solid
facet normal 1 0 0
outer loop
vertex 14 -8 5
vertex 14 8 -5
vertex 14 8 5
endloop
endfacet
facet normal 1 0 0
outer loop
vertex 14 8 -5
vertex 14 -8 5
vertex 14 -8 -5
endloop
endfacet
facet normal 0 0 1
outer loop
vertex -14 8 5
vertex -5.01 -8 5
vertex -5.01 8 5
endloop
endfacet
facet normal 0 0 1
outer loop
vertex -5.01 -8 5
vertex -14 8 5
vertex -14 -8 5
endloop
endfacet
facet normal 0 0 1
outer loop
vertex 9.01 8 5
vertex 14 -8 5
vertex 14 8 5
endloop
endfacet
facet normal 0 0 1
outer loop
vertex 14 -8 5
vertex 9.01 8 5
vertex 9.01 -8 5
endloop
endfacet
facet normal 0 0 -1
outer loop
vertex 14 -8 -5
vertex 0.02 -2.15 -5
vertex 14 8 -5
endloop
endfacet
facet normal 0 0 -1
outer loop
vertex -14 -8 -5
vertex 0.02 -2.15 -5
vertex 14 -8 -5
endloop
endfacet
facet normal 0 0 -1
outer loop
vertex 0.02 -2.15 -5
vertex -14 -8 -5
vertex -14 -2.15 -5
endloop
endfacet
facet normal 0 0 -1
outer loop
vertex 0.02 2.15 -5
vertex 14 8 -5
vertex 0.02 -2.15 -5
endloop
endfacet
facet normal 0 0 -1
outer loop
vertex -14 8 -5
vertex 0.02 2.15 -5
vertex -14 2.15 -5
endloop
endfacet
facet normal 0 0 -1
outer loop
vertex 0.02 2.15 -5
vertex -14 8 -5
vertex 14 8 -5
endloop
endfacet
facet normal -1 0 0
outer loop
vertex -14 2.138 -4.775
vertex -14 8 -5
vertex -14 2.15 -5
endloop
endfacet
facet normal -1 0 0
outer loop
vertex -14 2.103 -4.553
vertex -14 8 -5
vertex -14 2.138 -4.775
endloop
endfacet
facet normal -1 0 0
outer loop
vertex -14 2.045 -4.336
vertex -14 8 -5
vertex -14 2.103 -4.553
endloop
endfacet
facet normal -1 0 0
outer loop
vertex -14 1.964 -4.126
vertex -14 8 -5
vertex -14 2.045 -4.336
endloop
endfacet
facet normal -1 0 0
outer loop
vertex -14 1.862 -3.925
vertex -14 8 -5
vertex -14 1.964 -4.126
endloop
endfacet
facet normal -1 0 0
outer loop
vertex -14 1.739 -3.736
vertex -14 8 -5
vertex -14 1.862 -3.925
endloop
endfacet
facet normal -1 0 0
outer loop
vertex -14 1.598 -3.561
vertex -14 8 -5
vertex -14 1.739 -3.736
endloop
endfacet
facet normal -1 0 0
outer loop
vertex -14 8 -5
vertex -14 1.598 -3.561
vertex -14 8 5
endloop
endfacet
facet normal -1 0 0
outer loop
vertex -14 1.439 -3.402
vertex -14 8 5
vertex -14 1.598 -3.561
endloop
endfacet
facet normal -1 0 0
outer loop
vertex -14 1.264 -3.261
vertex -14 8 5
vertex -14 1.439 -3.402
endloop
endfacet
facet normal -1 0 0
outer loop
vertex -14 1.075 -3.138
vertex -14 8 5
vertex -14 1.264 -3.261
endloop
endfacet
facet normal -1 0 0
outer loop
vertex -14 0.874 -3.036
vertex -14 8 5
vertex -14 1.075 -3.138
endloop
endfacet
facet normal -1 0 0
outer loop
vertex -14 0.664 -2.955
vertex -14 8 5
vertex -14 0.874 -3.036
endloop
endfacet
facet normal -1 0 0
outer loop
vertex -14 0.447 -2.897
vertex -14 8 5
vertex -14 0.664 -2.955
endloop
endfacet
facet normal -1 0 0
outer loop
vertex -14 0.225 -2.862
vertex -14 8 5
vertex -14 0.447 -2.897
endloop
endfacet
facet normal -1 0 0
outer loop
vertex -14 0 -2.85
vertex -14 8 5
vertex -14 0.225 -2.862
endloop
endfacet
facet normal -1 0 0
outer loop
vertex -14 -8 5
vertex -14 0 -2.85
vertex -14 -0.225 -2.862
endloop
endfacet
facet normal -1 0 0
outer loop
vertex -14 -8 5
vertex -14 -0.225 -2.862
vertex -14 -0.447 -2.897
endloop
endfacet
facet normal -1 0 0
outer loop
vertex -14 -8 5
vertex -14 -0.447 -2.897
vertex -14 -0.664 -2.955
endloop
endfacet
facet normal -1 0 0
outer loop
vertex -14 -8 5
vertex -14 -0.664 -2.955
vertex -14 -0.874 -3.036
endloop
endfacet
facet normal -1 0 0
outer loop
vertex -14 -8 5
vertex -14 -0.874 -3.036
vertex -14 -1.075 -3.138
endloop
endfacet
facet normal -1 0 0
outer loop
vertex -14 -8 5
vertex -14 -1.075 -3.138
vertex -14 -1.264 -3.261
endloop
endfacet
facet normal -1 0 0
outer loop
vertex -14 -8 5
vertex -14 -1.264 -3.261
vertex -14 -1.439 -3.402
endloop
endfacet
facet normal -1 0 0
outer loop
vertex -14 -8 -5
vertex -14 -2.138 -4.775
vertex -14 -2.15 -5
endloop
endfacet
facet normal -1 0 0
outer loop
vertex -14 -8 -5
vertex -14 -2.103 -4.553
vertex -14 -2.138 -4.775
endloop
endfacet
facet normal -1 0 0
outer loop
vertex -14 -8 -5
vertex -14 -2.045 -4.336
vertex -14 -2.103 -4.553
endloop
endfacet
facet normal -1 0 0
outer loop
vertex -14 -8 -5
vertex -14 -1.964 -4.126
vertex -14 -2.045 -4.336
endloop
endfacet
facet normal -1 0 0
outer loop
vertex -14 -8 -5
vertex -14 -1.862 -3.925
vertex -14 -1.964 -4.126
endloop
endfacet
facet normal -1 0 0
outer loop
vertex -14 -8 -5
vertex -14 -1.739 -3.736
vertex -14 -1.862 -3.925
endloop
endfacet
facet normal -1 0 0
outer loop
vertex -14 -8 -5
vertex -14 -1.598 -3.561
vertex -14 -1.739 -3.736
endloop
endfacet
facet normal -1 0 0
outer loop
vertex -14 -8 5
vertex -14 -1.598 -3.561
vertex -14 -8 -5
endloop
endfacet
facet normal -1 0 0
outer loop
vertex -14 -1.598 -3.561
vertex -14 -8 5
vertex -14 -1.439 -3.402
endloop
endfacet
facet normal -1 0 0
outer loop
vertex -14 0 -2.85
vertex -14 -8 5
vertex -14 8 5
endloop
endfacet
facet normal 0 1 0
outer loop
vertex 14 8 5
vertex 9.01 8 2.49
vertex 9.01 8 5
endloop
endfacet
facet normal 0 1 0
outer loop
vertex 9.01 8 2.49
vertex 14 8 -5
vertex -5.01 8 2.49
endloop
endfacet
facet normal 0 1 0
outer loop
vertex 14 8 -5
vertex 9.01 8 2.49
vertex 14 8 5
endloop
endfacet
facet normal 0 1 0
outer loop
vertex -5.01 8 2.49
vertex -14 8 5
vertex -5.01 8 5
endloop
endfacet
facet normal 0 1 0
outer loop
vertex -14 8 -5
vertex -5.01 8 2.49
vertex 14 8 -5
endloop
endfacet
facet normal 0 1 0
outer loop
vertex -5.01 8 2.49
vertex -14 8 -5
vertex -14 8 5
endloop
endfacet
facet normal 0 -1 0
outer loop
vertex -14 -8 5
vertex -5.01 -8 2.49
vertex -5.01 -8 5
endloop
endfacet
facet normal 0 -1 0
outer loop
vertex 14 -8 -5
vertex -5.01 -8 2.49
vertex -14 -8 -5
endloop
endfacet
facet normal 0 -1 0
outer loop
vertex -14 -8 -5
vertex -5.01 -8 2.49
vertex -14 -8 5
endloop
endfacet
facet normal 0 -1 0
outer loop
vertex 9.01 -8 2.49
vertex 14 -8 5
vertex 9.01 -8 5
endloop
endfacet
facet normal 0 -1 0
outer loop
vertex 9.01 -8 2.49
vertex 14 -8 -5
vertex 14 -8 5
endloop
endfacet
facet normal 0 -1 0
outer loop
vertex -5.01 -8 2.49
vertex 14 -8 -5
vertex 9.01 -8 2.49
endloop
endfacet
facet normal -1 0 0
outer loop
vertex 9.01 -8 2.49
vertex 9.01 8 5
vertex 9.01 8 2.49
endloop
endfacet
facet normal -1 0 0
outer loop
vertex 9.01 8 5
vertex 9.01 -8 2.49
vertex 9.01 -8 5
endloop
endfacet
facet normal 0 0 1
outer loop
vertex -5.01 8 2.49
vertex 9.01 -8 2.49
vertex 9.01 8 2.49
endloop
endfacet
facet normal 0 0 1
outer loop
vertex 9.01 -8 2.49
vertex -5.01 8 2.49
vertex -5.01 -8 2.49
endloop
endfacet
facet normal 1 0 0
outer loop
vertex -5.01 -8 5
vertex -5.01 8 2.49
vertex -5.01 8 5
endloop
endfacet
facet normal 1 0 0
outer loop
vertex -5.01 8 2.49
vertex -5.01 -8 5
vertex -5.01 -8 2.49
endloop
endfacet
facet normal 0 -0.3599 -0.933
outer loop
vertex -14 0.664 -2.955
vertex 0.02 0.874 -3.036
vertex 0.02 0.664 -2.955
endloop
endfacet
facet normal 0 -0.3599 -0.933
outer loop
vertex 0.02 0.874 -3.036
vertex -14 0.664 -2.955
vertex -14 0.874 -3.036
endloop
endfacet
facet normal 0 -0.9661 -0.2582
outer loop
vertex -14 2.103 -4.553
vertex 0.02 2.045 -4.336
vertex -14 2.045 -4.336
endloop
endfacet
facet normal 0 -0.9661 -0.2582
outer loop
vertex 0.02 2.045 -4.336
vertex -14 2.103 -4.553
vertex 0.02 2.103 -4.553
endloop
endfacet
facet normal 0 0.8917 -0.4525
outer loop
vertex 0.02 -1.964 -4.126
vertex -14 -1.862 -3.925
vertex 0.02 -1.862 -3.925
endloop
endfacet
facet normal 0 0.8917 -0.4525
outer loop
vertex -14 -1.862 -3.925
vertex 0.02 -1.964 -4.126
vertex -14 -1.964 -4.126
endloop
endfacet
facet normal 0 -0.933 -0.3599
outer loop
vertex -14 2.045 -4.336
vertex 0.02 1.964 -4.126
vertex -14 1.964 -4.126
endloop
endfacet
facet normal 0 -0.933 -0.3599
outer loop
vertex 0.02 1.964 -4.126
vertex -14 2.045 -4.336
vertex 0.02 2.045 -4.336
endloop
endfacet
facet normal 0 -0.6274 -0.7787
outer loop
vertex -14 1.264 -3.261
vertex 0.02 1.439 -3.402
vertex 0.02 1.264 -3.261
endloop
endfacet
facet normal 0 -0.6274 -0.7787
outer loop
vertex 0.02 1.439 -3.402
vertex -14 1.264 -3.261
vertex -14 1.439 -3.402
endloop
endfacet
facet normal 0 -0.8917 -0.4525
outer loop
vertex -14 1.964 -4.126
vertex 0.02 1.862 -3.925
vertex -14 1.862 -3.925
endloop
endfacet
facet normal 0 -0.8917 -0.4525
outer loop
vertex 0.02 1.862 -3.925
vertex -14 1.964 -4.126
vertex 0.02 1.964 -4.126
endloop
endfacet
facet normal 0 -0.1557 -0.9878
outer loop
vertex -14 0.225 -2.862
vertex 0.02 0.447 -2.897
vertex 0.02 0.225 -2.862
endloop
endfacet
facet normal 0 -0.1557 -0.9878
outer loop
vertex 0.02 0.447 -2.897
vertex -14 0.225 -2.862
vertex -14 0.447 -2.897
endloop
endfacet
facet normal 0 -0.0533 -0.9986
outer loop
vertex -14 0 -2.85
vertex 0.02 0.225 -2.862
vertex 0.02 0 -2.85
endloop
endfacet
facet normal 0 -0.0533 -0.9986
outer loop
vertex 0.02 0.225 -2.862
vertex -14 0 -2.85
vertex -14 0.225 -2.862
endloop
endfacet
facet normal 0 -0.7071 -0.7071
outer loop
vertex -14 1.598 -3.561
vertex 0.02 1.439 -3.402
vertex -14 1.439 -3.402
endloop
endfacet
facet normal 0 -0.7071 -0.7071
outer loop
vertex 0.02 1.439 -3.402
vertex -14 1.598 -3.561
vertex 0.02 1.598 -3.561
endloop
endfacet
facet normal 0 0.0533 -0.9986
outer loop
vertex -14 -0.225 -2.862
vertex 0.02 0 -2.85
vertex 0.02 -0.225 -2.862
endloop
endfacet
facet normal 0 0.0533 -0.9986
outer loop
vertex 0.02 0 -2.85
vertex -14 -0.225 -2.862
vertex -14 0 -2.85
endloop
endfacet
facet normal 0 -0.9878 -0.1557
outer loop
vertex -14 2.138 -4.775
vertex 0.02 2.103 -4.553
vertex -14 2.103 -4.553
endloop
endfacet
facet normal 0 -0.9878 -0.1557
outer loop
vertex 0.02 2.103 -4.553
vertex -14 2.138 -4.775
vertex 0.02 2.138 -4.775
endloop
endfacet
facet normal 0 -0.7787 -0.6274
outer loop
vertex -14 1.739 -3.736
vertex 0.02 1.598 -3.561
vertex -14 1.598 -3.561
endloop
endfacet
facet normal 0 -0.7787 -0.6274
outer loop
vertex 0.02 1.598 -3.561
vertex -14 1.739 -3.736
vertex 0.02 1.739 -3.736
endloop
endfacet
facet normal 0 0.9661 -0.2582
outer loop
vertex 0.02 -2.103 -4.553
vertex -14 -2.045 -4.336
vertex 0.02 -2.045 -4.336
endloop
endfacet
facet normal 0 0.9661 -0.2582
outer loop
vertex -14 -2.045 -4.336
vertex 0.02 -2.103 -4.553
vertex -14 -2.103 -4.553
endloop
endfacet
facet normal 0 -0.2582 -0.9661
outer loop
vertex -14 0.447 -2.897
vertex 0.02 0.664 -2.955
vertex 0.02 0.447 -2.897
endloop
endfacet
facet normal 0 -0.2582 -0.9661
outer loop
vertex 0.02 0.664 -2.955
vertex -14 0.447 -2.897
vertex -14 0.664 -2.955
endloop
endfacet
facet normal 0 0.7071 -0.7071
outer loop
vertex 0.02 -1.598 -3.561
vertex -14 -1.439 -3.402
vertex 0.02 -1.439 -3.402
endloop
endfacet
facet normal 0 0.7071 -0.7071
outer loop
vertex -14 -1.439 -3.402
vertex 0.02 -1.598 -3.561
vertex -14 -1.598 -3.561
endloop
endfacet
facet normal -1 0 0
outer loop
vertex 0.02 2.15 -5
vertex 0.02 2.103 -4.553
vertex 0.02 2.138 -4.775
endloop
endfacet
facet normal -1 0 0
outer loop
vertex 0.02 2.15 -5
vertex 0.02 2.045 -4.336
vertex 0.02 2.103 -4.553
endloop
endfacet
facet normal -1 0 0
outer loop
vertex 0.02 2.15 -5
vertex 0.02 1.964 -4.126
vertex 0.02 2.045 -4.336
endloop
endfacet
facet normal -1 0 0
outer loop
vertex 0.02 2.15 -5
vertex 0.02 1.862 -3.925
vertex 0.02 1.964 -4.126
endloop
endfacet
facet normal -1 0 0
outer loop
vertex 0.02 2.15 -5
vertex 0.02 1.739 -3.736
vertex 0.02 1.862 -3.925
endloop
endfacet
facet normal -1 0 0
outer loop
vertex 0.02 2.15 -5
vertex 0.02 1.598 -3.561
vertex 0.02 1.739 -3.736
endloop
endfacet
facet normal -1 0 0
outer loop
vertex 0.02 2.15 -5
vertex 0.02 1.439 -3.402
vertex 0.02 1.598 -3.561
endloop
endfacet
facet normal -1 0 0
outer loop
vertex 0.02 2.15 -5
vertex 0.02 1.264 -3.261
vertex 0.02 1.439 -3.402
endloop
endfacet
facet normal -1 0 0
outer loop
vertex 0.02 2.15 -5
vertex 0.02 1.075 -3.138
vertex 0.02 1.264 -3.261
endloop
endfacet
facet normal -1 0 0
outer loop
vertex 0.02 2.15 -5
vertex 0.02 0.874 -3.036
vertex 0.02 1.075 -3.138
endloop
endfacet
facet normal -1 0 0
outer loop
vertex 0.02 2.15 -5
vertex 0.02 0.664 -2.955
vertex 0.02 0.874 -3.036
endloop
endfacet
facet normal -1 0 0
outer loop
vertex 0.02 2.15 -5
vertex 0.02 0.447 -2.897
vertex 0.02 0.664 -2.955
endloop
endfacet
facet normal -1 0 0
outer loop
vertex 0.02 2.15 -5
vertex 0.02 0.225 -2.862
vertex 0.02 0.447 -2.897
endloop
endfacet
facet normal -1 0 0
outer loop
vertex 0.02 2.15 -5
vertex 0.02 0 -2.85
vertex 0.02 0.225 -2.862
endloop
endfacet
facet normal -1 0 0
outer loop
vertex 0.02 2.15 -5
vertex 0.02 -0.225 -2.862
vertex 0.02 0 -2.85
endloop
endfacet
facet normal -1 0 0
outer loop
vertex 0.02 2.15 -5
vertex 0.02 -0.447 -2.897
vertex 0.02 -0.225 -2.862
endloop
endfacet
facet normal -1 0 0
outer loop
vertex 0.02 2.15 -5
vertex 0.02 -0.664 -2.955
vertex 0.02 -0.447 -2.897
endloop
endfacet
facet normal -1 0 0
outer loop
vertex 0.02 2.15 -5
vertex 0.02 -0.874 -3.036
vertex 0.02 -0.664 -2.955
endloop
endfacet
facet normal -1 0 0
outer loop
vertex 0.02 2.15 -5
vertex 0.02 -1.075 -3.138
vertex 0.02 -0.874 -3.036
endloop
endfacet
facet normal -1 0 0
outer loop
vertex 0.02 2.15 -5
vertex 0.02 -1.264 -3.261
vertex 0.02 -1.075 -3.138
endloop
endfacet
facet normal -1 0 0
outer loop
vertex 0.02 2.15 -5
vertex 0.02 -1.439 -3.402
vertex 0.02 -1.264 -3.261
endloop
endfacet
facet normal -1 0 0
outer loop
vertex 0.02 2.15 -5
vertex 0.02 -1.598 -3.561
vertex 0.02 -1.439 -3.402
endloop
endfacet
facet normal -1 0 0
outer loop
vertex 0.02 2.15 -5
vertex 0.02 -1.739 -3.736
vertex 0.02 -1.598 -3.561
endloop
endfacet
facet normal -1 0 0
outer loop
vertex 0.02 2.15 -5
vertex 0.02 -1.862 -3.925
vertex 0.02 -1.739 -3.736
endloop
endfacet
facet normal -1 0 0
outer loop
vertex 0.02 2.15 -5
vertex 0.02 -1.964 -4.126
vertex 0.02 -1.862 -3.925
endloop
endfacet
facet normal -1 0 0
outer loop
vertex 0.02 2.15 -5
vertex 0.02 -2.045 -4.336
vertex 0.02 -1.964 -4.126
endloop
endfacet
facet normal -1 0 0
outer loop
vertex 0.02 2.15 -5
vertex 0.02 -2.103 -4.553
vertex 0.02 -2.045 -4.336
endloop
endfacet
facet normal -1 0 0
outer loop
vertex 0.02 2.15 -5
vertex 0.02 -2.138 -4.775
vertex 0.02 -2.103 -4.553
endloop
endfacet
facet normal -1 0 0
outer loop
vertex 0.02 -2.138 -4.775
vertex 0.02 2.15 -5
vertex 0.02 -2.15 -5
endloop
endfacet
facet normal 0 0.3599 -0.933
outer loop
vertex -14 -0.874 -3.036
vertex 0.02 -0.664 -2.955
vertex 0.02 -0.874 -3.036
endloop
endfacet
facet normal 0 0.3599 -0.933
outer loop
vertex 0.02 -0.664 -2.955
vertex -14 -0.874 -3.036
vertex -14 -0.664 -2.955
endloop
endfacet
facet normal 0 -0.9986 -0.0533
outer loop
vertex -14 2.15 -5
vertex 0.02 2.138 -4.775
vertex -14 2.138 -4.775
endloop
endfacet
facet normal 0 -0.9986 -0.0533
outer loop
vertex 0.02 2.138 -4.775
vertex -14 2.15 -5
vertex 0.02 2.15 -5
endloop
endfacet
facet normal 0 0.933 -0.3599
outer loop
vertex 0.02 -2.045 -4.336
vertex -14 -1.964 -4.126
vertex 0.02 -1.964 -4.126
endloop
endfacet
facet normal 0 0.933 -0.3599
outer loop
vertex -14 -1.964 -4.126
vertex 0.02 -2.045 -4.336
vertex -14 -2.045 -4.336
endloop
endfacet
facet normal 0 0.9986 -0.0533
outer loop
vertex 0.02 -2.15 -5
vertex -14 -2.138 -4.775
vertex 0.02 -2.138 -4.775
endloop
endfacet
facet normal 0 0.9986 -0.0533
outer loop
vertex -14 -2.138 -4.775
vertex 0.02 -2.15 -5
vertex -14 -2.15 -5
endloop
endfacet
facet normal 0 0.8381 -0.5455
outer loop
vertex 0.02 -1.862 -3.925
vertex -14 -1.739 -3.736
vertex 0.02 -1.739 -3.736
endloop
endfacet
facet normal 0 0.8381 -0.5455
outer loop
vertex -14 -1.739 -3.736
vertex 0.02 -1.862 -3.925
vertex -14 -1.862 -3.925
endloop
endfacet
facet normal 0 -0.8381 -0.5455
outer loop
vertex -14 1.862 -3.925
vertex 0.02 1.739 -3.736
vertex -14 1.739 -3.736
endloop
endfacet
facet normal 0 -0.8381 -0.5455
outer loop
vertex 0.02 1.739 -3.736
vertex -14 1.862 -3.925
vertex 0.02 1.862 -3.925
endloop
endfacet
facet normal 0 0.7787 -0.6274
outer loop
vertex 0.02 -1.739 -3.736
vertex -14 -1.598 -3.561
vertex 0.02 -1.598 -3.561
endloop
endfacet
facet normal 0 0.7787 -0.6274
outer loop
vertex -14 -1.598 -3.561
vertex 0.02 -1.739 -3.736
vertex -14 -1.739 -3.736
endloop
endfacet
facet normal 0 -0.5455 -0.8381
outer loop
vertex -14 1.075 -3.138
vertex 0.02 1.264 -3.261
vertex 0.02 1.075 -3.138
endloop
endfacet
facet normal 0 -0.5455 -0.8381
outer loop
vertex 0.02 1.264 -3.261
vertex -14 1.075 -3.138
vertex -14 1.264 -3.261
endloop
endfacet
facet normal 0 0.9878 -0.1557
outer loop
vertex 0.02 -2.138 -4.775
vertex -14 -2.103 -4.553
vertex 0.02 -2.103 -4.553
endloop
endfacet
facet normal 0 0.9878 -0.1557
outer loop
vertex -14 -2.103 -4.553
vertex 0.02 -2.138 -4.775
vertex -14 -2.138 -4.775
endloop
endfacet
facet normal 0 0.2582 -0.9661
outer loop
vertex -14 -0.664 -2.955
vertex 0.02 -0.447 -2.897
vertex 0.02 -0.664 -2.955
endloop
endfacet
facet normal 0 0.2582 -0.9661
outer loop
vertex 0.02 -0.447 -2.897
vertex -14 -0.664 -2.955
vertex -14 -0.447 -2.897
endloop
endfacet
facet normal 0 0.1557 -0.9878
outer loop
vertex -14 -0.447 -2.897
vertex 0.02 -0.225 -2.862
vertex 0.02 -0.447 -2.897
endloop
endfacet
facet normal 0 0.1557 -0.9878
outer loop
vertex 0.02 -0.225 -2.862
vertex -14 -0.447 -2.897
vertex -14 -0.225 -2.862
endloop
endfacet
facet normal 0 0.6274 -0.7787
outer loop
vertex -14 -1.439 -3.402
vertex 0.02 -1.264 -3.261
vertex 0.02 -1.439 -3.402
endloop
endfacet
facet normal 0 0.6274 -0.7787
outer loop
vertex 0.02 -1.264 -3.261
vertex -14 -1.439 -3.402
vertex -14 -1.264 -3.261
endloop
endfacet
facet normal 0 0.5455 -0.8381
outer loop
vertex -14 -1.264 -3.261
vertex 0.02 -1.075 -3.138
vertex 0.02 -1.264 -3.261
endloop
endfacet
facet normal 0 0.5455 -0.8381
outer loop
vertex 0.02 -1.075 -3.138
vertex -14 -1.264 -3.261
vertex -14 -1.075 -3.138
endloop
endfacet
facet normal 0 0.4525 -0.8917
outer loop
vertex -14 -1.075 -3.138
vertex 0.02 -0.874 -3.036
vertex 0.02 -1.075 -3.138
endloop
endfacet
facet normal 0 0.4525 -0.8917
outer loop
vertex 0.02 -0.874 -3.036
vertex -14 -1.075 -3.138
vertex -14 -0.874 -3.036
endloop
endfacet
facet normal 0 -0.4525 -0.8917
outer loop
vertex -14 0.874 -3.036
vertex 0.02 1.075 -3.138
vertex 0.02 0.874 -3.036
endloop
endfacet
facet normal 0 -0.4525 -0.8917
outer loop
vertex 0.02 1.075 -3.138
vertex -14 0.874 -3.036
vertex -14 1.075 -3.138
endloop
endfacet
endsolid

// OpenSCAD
// Snap panel clip with a U-shaped panel slot.
$fn = 60;
eps = 0.02;
panel_t = 2;
clip_w = 16;
clip_l = 28;
clip_h = panel_t + 8;
slot = panel_t + 0.5;
difference() {
    cube([clip_l,clip_w,clip_h],center=true);
    translate([2,0,clip_h/2-slot/2]) cube([clip_l/2+eps,clip_w+2*eps,slot+eps],center=true);
    translate([-clip_l/2-eps,0,-clip_h/2]) rotate([0,90,0]) cylinder(d=4.3,h=clip_l/2+2*eps);
}
